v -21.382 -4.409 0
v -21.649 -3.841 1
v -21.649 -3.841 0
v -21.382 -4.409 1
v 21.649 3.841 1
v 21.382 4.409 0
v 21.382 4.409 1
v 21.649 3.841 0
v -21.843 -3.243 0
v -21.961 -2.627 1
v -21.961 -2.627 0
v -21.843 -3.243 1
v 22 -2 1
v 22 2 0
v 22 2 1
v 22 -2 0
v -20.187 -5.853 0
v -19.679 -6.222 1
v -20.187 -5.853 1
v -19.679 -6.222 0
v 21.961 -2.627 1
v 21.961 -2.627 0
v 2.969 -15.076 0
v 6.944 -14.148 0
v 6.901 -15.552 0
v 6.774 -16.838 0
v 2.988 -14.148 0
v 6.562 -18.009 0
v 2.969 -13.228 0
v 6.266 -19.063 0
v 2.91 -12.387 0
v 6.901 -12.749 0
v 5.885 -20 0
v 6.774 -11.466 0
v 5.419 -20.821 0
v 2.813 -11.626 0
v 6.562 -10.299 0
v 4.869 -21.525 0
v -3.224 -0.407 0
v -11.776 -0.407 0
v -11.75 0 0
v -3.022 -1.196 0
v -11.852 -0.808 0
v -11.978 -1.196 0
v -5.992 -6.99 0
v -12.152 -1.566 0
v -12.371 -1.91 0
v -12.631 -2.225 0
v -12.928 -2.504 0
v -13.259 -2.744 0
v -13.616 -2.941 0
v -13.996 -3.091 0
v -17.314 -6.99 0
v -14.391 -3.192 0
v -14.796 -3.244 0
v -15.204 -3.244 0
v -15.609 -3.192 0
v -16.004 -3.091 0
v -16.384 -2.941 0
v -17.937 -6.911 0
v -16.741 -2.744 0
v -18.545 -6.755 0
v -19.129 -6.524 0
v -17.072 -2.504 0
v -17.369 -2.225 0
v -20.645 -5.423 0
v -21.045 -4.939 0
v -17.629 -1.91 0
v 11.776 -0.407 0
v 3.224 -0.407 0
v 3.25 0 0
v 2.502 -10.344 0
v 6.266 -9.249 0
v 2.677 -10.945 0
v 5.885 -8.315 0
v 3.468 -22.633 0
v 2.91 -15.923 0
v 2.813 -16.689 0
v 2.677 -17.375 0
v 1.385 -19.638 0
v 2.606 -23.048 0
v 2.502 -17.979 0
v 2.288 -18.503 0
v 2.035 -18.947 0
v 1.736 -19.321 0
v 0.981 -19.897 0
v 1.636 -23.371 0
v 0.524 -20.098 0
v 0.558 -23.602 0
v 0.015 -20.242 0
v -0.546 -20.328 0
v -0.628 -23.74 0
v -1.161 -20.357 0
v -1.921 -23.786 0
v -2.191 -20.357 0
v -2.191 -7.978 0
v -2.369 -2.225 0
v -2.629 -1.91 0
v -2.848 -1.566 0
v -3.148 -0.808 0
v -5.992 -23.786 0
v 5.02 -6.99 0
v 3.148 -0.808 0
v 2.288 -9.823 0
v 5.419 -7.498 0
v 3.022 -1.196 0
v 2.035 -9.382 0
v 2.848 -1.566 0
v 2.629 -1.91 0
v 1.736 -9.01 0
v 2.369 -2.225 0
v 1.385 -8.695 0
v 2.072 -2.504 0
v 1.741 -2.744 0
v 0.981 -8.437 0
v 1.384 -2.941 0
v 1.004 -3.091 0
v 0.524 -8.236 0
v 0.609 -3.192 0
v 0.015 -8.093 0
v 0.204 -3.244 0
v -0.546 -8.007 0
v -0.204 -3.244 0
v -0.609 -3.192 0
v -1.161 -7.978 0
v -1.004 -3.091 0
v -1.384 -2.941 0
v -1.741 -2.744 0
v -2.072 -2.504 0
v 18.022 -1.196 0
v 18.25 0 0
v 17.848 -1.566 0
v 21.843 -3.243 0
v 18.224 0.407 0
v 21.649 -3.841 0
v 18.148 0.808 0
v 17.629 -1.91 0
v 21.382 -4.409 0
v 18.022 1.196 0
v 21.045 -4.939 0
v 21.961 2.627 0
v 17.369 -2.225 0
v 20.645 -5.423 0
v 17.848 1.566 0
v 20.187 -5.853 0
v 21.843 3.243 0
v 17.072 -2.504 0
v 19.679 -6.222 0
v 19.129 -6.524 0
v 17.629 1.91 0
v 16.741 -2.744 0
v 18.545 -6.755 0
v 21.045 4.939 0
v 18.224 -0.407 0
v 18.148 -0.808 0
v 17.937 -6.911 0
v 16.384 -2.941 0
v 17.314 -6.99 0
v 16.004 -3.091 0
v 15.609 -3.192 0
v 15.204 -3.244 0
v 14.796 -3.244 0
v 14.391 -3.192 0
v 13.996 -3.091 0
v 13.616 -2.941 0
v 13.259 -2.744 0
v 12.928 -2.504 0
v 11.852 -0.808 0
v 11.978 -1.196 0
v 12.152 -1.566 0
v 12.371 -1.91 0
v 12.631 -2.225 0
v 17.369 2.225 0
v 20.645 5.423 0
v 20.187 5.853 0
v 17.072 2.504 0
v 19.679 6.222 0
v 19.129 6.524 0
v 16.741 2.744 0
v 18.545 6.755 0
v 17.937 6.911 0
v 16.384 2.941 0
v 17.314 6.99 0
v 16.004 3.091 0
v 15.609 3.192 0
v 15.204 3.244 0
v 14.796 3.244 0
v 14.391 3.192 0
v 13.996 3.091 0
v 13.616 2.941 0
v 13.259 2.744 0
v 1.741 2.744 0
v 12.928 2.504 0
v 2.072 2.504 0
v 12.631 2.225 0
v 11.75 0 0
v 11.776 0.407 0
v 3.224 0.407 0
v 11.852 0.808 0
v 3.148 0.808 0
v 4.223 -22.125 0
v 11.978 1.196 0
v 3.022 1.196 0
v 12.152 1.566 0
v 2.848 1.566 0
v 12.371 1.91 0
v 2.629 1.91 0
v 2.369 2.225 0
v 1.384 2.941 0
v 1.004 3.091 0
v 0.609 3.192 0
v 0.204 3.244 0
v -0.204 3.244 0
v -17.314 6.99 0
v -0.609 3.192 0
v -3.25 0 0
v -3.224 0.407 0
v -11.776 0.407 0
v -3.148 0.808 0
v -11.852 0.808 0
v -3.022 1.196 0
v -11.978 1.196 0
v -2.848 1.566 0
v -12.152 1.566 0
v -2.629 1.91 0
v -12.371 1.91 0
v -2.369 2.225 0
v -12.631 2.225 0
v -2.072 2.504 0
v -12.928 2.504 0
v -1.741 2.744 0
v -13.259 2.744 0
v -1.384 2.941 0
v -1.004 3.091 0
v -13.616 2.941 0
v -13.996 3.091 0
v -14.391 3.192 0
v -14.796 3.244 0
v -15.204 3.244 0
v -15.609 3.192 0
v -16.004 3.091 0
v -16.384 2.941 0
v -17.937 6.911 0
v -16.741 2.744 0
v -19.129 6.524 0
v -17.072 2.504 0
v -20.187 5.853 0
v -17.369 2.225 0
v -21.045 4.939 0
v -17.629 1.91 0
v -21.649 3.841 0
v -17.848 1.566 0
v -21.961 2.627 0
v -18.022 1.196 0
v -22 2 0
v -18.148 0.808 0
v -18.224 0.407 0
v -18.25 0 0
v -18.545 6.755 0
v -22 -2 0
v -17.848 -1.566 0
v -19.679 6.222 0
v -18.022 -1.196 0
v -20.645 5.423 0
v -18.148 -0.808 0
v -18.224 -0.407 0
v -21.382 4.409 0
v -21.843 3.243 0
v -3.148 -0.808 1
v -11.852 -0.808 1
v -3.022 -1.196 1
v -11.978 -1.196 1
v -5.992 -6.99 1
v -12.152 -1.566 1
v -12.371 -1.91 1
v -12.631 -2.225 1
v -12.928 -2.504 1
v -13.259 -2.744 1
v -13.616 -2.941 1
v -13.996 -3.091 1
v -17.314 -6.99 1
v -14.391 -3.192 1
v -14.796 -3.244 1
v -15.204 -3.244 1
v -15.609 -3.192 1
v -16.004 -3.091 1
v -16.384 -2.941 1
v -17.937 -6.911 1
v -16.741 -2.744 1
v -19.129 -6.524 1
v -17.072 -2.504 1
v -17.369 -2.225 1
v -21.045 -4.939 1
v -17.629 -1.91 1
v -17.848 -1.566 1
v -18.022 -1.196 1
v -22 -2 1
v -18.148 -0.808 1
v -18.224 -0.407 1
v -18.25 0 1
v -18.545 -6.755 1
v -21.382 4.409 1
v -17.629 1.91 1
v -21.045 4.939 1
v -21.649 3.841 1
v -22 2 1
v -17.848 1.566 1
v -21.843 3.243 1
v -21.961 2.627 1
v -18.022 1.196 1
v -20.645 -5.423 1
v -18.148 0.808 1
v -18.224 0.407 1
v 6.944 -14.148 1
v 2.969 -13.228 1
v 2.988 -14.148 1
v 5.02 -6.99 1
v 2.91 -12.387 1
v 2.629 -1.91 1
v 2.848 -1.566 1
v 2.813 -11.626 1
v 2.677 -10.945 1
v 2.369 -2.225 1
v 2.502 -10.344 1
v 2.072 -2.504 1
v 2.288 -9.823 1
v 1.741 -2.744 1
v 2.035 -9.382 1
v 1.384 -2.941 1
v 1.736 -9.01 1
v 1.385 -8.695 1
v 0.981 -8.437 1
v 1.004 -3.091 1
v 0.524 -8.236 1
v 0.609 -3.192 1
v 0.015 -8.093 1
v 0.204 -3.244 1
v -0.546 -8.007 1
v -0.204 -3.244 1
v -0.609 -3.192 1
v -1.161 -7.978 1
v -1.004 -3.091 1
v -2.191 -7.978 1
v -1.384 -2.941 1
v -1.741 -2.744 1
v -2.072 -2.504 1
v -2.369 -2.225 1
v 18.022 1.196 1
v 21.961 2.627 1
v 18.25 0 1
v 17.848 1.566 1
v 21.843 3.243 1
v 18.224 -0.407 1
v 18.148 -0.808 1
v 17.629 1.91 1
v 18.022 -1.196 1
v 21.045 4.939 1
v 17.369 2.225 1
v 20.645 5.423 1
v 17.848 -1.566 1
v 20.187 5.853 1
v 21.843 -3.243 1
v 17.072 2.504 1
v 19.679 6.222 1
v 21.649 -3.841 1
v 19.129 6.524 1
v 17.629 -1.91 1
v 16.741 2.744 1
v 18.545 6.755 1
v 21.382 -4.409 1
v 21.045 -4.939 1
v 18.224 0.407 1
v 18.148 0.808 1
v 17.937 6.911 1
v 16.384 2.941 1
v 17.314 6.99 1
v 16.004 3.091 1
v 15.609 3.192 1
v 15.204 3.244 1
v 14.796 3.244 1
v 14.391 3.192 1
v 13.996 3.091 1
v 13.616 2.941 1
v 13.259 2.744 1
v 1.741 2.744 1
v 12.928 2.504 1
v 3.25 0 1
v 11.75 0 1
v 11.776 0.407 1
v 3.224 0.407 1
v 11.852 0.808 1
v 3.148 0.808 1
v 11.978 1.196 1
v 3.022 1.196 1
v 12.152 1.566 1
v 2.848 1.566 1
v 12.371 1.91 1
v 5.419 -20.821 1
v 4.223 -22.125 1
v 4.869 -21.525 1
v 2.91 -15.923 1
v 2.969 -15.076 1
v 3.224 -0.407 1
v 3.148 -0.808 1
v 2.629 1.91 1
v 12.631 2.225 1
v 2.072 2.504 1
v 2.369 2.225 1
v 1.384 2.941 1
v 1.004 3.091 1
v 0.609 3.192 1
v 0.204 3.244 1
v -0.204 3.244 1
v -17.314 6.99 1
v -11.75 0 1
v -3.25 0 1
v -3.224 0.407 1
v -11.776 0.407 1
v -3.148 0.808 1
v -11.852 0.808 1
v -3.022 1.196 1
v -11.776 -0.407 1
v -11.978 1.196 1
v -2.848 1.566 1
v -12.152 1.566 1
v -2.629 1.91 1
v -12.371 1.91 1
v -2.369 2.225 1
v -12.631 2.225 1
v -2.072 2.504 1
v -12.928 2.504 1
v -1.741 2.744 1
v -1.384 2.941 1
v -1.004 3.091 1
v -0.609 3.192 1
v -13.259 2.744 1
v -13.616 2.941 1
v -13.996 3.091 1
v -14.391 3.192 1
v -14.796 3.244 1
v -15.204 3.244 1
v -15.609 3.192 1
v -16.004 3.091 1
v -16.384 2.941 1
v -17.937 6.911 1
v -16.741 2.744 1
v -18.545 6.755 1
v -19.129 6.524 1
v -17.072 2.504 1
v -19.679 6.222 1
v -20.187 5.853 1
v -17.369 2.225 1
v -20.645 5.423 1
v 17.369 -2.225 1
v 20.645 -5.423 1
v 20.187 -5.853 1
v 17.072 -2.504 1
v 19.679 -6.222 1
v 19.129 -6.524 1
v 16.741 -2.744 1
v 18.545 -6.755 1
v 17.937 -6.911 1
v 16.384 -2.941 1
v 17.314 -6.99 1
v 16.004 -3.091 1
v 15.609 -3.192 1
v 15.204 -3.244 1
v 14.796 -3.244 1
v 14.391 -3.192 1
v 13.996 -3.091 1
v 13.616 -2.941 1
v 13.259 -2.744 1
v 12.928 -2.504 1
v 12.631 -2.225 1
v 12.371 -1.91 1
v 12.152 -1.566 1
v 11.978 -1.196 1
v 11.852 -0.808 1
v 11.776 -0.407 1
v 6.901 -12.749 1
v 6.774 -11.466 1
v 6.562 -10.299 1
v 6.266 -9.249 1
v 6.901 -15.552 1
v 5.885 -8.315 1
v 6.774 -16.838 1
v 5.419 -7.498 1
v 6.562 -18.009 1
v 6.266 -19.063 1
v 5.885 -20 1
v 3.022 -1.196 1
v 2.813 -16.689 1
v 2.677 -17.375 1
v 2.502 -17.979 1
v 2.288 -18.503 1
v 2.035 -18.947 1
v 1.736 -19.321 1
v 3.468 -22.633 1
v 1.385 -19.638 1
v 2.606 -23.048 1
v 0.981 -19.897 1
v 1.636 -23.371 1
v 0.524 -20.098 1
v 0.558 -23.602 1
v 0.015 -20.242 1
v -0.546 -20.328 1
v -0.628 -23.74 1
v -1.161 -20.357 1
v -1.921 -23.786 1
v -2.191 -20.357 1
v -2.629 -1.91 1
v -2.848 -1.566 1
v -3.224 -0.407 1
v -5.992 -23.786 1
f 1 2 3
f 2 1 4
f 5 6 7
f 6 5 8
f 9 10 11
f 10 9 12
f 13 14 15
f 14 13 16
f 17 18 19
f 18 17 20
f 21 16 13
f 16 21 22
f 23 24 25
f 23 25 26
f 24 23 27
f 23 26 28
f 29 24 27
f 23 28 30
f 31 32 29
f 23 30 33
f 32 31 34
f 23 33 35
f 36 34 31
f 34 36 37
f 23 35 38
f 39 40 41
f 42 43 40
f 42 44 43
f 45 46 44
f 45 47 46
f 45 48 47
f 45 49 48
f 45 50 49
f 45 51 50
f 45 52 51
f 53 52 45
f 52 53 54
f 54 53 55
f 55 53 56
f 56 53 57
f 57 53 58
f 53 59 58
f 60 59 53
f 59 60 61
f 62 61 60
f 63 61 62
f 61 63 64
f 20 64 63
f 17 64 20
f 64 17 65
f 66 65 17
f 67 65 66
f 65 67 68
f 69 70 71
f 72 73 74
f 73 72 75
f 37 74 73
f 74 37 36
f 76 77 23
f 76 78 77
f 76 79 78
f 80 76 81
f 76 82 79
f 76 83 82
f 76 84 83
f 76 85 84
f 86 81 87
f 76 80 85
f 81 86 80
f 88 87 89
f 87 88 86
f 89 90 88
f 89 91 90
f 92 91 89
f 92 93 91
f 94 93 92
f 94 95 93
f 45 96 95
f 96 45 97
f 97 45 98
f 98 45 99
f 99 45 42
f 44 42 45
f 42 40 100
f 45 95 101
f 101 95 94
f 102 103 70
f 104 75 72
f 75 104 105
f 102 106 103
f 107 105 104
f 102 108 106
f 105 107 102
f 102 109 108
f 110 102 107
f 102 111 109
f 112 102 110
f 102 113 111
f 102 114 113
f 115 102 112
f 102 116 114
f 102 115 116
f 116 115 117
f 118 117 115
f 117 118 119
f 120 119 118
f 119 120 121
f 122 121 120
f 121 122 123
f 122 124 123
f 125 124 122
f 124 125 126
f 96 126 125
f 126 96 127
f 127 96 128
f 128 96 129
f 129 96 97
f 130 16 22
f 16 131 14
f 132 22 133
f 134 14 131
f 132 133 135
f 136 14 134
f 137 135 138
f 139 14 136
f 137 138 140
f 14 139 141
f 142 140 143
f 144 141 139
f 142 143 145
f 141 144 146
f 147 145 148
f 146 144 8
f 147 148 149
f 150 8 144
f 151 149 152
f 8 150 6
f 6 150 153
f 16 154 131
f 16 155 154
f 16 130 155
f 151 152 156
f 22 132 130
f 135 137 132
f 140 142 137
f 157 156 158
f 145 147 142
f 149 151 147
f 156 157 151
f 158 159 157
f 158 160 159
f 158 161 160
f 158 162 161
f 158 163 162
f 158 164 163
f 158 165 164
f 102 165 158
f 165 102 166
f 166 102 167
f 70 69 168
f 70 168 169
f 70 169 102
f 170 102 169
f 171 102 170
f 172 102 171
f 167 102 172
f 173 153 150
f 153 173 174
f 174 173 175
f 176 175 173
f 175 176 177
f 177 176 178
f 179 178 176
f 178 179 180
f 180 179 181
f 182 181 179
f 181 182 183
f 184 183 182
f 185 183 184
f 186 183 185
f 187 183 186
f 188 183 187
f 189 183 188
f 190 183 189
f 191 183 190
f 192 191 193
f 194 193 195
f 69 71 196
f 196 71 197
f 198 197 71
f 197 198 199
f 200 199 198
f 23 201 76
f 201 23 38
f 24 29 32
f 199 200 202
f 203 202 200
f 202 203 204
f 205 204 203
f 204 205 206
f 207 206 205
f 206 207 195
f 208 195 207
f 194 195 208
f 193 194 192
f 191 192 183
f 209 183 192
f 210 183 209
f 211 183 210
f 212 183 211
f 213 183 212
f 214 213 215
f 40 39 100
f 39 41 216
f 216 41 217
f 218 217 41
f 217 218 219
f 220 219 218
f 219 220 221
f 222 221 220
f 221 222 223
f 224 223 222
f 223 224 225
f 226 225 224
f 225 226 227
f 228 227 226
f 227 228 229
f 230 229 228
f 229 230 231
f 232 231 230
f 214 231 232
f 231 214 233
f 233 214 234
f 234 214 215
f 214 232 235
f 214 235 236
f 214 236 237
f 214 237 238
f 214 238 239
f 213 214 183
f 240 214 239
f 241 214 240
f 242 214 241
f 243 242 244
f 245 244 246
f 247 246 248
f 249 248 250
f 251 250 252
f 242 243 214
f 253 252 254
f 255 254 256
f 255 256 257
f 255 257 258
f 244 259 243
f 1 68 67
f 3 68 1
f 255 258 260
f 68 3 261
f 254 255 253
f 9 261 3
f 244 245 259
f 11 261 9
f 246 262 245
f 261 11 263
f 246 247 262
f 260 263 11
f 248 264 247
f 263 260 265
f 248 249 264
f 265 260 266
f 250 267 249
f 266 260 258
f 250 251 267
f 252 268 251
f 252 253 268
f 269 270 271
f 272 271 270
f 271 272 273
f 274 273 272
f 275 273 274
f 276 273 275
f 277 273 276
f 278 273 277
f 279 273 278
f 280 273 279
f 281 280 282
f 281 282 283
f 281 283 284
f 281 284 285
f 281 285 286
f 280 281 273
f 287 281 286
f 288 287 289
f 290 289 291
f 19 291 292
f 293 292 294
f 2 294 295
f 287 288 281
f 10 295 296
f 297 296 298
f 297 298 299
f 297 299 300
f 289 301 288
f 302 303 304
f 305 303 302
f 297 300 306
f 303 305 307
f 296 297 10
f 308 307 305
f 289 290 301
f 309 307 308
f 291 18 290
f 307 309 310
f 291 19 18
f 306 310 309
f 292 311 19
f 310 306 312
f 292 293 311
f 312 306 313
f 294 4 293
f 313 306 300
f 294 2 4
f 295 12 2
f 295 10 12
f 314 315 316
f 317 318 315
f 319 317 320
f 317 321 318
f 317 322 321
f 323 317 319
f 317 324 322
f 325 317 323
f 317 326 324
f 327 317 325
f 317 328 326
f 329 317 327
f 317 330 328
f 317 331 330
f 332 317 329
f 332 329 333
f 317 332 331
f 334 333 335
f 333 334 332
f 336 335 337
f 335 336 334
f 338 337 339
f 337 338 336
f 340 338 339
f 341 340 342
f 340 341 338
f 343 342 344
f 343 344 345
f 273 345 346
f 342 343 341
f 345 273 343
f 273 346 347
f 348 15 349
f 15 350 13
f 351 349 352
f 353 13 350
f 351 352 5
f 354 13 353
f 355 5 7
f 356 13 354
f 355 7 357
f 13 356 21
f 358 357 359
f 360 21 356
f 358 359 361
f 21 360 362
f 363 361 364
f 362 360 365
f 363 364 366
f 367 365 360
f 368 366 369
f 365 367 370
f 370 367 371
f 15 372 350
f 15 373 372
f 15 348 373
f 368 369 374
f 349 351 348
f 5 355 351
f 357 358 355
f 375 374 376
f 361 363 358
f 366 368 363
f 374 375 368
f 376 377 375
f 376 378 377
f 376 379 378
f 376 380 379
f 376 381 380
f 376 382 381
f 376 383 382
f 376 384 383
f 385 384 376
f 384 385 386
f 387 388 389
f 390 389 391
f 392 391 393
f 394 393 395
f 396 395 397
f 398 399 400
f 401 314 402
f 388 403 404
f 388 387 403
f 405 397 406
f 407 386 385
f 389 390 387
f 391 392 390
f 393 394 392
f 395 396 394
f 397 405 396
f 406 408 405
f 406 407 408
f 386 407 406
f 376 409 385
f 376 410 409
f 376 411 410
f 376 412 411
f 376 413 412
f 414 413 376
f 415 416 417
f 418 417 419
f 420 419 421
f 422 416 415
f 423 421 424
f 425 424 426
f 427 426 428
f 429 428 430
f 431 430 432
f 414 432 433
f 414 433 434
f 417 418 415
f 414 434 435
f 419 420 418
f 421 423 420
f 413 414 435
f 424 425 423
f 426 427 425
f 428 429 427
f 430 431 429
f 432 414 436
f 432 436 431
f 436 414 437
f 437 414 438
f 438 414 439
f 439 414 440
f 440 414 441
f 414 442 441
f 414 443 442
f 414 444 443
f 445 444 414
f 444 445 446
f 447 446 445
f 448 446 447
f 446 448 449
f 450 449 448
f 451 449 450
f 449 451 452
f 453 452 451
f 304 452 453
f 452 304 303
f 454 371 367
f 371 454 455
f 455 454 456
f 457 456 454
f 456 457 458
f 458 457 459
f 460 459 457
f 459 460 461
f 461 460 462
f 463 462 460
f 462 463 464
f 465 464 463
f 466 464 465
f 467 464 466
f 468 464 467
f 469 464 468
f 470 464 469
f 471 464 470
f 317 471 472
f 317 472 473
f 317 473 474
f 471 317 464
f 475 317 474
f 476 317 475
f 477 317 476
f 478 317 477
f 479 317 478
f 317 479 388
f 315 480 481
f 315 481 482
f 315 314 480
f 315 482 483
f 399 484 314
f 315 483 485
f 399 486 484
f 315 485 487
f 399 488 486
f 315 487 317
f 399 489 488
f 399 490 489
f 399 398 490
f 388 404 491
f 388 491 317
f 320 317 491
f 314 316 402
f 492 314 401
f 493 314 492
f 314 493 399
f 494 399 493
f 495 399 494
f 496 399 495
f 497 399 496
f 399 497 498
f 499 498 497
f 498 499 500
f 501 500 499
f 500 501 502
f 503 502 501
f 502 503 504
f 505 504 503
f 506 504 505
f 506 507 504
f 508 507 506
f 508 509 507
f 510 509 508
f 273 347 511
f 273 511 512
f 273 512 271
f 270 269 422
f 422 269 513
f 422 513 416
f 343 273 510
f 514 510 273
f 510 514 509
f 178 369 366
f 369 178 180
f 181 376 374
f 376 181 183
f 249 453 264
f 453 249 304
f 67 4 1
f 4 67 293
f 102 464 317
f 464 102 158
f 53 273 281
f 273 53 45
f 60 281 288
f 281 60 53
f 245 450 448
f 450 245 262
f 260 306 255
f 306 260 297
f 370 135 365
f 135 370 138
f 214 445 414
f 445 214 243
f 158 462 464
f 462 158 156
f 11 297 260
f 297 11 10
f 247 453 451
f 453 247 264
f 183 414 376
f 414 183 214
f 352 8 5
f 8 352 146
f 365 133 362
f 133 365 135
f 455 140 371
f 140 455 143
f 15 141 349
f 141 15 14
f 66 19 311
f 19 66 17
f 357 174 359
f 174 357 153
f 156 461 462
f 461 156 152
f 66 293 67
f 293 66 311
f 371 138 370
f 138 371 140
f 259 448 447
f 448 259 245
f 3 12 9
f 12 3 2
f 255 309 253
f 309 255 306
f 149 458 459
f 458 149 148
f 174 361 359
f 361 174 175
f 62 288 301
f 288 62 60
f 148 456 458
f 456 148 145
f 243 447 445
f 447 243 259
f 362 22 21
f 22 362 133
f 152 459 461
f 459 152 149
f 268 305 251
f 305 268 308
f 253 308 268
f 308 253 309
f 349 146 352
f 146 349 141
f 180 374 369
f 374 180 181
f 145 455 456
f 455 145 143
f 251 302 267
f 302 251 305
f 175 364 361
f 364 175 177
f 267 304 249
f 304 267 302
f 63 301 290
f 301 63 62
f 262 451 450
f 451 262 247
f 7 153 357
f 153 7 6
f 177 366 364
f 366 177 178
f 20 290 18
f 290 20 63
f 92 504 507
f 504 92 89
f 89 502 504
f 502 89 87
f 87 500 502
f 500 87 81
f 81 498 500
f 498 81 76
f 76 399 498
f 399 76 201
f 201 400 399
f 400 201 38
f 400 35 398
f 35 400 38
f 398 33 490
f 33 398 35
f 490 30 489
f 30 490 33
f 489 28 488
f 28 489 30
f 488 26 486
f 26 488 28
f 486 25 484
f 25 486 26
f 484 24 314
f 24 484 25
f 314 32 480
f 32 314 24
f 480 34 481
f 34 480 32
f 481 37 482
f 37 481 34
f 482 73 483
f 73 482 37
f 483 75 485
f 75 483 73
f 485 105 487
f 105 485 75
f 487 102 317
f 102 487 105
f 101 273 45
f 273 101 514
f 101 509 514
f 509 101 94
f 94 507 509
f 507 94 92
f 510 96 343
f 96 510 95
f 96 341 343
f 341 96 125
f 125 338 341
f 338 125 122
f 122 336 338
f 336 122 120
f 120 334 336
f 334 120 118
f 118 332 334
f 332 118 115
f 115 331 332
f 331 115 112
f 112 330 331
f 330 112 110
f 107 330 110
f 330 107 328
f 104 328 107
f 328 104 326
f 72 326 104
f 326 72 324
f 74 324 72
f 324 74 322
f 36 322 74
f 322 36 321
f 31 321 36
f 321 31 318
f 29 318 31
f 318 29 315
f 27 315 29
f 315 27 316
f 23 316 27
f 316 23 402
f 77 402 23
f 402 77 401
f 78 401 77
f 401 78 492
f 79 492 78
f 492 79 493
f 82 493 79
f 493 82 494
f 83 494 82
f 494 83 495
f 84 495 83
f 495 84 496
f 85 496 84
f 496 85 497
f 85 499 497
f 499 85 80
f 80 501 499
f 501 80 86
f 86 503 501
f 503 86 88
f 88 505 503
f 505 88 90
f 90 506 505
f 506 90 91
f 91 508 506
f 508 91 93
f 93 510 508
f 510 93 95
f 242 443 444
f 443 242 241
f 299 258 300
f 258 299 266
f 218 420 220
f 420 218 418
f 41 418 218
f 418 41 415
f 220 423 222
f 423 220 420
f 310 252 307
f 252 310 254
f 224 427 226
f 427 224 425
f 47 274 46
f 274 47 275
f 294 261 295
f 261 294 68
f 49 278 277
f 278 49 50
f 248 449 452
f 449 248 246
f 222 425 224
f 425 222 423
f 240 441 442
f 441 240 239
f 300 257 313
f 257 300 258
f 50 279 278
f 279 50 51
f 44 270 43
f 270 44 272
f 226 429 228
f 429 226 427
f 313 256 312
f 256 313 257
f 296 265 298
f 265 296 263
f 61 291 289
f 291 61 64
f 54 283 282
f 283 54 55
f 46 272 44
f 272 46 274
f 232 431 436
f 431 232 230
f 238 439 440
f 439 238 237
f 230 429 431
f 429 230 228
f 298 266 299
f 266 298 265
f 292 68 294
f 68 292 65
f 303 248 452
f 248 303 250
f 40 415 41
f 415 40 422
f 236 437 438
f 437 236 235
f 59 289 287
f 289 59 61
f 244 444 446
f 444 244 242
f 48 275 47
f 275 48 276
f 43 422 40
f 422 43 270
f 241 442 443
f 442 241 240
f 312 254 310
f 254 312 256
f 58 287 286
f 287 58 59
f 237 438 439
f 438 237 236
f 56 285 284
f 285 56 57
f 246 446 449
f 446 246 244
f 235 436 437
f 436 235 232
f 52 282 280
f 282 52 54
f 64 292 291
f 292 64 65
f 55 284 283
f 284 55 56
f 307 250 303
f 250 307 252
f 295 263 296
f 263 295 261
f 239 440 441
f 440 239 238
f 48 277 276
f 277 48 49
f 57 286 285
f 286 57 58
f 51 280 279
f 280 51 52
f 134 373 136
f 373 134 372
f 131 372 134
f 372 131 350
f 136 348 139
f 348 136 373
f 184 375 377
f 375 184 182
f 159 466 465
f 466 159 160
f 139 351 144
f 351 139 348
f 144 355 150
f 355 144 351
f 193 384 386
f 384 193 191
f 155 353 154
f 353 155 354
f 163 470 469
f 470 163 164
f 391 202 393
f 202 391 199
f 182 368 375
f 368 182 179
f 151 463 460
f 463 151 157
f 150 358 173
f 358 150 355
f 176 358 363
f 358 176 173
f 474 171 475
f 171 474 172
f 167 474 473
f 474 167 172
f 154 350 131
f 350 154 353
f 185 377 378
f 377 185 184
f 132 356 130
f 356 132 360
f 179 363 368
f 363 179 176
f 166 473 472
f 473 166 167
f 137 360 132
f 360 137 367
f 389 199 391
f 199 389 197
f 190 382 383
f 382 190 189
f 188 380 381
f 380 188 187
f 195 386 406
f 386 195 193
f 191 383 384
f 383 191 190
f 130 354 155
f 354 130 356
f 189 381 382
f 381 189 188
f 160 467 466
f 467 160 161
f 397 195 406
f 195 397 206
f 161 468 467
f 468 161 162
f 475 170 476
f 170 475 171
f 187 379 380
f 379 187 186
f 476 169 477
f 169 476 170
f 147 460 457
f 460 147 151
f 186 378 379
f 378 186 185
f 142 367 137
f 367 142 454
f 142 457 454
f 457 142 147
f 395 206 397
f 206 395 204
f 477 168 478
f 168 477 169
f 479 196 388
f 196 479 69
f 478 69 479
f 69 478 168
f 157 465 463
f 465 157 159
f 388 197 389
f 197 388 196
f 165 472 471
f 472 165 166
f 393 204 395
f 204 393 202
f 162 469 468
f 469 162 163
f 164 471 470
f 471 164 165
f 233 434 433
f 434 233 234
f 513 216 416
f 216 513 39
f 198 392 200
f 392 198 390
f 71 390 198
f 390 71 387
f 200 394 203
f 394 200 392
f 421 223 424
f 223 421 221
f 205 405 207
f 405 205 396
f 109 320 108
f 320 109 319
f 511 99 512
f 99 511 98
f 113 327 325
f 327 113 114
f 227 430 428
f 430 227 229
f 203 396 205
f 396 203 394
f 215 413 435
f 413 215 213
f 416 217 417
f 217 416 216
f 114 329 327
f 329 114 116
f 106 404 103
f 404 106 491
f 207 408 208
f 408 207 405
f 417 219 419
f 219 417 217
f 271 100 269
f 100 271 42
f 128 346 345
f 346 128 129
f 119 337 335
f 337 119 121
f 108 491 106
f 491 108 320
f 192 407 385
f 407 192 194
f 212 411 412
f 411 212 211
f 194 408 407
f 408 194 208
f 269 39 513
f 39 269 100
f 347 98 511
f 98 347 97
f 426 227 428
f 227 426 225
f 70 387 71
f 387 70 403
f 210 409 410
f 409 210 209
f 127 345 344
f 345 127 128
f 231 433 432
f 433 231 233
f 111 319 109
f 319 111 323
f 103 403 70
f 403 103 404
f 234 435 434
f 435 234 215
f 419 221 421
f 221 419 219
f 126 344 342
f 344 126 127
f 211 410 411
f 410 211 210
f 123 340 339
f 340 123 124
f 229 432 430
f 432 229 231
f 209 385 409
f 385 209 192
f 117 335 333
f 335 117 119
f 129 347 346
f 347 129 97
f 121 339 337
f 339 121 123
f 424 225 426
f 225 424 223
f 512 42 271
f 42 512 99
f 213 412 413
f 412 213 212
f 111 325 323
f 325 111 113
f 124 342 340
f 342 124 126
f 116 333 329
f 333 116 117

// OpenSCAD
$fn = 50;


difference() {
	union() {
		translate(v = [0, 0, 0]) {
			rotate(a = [0, 0, 0]) {
				hull() {
					translate(v = [-17.0000000000, 2.0000000000, 0]) {
						rotate(a = [0, 0, 0]) {
							translate(v = [0, 0, 0]) {
								rotate(a = [0, 0, 0]) {
									cylinder(h = 1, r = 5);
								}
							}
						}
					}
					translate(v = [17.0000000000, 2.0000000000, 0]) {
						rotate(a = [0, 0, 0]) {
							translate(v = [0, 0, 0]) {
								rotate(a = [0, 0, 0]) {
									cylinder(h = 1, r = 5);
								}
							}
						}
					}
					translate(v = [-17.0000000000, -2.0000000000, 0]) {
						rotate(a = [0, 0, 0]) {
							translate(v = [0, 0, 0]) {
								rotate(a = [0, 0, 0]) {
									cylinder(h = 1, r = 5);
								}
							}
						}
					}
					translate(v = [17.0000000000, -2.0000000000, 0]) {
						rotate(a = [0, 0, 0]) {
							translate(v = [0, 0, 0]) {
								rotate(a = [0, 0, 0]) {
									cylinder(h = 1, r = 5);
								}
							}
						}
					}
				}
			}
		}
		translate(v = [0, -5, 0]) {
			rotate(a = [0, 0, 0]) {
				linear_extrude(height = 1) {
					text(font = "DejaVu Sans Mono:style=Bold", halign = "center", size = 19.0000000000, text = "D", valign = "top");
				}
			}
		}
	}
	union() {
		translate(v = [-15.0000000000, 0.0000000000, -125.0000000000]) {
			rotate(a = [0, 0, 0]) {
				cylinder(h = 250, r = 3.2500000000);
			}
		}
		translate(v = [15.0000000000, 0.0000000000, -125.0000000000]) {
			rotate(a = [0, 0, 0]) {
				cylinder(h = 250, r = 3.2500000000);
			}
		}
		translate(v = [15.0000000000, 0.0000000000, -125.0000000000]) {
			rotate(a = [0, 0, 0]) {
				cylinder(h = 250, r = 3.2500000000);
			}
		}
		translate(v = [0, 0, -125.0000000000]) {
			rotate(a = [0, 0, 0]) {
				cylinder(h = 250, r = 3.2500000000);
			}
		}
	}
}
